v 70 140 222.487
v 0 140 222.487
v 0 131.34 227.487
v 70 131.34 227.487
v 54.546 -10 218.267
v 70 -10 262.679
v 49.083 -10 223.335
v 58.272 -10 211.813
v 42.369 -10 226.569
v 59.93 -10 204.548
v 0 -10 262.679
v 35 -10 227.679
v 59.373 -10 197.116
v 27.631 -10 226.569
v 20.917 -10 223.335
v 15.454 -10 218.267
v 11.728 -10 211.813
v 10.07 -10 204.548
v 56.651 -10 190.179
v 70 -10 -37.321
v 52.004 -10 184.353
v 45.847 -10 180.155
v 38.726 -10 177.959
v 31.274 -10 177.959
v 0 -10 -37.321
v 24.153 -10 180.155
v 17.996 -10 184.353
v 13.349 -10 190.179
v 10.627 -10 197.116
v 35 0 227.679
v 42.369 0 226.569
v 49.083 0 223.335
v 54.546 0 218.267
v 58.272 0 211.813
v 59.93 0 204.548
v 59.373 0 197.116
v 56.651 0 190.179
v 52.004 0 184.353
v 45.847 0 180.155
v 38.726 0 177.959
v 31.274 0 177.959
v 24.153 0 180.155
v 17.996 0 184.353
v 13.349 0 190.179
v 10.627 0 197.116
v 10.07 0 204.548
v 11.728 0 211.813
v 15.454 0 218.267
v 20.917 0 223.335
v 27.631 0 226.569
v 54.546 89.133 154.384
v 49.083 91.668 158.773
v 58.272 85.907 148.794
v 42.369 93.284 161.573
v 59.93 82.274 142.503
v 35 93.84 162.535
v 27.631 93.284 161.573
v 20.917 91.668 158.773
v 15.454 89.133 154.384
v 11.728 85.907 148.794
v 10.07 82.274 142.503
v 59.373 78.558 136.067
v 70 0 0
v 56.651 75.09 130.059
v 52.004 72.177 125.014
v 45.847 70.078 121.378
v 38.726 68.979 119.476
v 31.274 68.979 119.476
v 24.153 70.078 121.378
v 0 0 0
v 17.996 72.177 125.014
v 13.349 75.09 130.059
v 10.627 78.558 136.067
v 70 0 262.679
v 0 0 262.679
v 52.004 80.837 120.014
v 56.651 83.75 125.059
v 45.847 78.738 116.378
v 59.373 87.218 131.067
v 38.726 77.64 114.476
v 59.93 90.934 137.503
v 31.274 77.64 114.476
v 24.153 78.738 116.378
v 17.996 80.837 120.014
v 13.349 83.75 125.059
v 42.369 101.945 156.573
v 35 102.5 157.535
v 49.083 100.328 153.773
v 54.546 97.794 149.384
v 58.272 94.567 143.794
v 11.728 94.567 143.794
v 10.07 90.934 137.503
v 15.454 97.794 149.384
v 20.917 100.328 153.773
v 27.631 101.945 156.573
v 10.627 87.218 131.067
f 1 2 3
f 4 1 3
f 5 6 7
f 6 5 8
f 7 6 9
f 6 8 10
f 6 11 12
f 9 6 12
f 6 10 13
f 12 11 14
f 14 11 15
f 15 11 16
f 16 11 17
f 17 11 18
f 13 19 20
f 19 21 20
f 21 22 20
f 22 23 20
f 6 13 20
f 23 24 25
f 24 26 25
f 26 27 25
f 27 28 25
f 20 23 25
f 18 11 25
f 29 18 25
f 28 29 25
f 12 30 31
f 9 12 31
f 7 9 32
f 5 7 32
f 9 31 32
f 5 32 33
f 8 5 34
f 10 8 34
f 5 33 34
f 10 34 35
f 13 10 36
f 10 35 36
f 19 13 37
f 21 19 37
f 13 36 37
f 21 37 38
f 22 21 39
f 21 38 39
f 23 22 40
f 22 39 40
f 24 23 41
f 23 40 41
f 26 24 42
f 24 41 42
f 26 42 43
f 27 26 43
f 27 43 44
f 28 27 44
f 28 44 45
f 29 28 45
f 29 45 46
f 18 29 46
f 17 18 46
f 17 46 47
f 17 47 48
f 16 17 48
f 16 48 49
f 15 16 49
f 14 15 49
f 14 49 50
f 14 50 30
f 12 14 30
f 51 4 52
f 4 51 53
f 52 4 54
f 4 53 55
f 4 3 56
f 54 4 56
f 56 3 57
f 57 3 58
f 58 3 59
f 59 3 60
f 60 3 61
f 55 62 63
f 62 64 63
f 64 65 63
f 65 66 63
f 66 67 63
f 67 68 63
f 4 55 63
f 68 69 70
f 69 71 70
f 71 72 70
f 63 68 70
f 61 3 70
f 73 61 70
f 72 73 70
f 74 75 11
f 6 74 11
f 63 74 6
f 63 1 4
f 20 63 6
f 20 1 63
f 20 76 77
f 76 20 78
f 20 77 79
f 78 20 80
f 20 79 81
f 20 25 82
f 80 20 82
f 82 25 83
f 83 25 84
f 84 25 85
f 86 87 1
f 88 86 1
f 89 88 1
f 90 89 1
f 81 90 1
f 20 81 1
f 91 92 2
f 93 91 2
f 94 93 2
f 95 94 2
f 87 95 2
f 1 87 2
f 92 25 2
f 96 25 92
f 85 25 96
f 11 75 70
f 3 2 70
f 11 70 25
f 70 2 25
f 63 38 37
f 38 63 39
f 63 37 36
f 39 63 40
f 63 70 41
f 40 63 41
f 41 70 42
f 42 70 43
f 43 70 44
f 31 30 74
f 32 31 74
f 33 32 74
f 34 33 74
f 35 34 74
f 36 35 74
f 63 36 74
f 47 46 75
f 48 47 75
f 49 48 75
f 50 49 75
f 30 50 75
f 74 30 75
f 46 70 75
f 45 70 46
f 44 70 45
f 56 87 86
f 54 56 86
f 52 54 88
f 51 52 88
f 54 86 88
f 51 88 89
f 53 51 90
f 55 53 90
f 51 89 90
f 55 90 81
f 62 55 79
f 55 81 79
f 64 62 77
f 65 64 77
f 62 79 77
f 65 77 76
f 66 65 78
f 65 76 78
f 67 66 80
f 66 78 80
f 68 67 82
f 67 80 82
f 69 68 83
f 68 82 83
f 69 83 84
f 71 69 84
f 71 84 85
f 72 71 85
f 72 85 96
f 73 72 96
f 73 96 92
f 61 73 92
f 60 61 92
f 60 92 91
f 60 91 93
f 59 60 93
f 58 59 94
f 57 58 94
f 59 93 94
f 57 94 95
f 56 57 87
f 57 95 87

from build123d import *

# Parameters (mm, degrees)
BOSS_EXTRUDE1_DEPTH = 70
SKETCH2_R           = 25
CUT_EXTRUDE1_DEPTH  = 10
SKETCH5_R           = 25
CUT_EXTRUDE3_DEPTH  = 300


with BuildPart() as part:
    # Sketch1 → Boss-Extrude1 (new body)
    with BuildSketch(Plane(origin=(0, 0, 0), x_dir=(0, 0, -1), z_dir=(1, 0, 0))):
        Polygon((-227.48711306, 131.339745962), (0, 0), (-262.679491924, 0), (-262.679491924, -10), (37.320508076, -10), (-222.48711306, 140), align=None)
    extrude(amount=BOSS_EXTRUDE1_DEPTH)

    # Sketch2 → Cut-Extrude1 (cut)
    with BuildSketch(Plane(origin=(0, 8.660254038, -5), x_dir=(1, 0, 0), z_dir=(0, 0.8660254037844418, -0.49999999999999445))):
        with Locations(Location((35, -162.679491924, 0), (0, 0, 270))):
            Circle(SKETCH2_R)
    extrude(amount=-CUT_EXTRUDE1_DEPTH, mode=Mode.SUBTRACT)

    # Sketch5 → Cut-Extrude3 (cut)
    with BuildSketch(Plane(origin=(0, 0, 0), x_dir=(1, 0, 0), z_dir=(0, 1, 0))):
        with Locations(Location((35, -202.679491924, 0), (0, 0, 270))):
            Circle(SKETCH5_R)
    extrude(amount=-CUT_EXTRUDE3_DEPTH, mode=Mode.SUBTRACT)


solid = part.part
